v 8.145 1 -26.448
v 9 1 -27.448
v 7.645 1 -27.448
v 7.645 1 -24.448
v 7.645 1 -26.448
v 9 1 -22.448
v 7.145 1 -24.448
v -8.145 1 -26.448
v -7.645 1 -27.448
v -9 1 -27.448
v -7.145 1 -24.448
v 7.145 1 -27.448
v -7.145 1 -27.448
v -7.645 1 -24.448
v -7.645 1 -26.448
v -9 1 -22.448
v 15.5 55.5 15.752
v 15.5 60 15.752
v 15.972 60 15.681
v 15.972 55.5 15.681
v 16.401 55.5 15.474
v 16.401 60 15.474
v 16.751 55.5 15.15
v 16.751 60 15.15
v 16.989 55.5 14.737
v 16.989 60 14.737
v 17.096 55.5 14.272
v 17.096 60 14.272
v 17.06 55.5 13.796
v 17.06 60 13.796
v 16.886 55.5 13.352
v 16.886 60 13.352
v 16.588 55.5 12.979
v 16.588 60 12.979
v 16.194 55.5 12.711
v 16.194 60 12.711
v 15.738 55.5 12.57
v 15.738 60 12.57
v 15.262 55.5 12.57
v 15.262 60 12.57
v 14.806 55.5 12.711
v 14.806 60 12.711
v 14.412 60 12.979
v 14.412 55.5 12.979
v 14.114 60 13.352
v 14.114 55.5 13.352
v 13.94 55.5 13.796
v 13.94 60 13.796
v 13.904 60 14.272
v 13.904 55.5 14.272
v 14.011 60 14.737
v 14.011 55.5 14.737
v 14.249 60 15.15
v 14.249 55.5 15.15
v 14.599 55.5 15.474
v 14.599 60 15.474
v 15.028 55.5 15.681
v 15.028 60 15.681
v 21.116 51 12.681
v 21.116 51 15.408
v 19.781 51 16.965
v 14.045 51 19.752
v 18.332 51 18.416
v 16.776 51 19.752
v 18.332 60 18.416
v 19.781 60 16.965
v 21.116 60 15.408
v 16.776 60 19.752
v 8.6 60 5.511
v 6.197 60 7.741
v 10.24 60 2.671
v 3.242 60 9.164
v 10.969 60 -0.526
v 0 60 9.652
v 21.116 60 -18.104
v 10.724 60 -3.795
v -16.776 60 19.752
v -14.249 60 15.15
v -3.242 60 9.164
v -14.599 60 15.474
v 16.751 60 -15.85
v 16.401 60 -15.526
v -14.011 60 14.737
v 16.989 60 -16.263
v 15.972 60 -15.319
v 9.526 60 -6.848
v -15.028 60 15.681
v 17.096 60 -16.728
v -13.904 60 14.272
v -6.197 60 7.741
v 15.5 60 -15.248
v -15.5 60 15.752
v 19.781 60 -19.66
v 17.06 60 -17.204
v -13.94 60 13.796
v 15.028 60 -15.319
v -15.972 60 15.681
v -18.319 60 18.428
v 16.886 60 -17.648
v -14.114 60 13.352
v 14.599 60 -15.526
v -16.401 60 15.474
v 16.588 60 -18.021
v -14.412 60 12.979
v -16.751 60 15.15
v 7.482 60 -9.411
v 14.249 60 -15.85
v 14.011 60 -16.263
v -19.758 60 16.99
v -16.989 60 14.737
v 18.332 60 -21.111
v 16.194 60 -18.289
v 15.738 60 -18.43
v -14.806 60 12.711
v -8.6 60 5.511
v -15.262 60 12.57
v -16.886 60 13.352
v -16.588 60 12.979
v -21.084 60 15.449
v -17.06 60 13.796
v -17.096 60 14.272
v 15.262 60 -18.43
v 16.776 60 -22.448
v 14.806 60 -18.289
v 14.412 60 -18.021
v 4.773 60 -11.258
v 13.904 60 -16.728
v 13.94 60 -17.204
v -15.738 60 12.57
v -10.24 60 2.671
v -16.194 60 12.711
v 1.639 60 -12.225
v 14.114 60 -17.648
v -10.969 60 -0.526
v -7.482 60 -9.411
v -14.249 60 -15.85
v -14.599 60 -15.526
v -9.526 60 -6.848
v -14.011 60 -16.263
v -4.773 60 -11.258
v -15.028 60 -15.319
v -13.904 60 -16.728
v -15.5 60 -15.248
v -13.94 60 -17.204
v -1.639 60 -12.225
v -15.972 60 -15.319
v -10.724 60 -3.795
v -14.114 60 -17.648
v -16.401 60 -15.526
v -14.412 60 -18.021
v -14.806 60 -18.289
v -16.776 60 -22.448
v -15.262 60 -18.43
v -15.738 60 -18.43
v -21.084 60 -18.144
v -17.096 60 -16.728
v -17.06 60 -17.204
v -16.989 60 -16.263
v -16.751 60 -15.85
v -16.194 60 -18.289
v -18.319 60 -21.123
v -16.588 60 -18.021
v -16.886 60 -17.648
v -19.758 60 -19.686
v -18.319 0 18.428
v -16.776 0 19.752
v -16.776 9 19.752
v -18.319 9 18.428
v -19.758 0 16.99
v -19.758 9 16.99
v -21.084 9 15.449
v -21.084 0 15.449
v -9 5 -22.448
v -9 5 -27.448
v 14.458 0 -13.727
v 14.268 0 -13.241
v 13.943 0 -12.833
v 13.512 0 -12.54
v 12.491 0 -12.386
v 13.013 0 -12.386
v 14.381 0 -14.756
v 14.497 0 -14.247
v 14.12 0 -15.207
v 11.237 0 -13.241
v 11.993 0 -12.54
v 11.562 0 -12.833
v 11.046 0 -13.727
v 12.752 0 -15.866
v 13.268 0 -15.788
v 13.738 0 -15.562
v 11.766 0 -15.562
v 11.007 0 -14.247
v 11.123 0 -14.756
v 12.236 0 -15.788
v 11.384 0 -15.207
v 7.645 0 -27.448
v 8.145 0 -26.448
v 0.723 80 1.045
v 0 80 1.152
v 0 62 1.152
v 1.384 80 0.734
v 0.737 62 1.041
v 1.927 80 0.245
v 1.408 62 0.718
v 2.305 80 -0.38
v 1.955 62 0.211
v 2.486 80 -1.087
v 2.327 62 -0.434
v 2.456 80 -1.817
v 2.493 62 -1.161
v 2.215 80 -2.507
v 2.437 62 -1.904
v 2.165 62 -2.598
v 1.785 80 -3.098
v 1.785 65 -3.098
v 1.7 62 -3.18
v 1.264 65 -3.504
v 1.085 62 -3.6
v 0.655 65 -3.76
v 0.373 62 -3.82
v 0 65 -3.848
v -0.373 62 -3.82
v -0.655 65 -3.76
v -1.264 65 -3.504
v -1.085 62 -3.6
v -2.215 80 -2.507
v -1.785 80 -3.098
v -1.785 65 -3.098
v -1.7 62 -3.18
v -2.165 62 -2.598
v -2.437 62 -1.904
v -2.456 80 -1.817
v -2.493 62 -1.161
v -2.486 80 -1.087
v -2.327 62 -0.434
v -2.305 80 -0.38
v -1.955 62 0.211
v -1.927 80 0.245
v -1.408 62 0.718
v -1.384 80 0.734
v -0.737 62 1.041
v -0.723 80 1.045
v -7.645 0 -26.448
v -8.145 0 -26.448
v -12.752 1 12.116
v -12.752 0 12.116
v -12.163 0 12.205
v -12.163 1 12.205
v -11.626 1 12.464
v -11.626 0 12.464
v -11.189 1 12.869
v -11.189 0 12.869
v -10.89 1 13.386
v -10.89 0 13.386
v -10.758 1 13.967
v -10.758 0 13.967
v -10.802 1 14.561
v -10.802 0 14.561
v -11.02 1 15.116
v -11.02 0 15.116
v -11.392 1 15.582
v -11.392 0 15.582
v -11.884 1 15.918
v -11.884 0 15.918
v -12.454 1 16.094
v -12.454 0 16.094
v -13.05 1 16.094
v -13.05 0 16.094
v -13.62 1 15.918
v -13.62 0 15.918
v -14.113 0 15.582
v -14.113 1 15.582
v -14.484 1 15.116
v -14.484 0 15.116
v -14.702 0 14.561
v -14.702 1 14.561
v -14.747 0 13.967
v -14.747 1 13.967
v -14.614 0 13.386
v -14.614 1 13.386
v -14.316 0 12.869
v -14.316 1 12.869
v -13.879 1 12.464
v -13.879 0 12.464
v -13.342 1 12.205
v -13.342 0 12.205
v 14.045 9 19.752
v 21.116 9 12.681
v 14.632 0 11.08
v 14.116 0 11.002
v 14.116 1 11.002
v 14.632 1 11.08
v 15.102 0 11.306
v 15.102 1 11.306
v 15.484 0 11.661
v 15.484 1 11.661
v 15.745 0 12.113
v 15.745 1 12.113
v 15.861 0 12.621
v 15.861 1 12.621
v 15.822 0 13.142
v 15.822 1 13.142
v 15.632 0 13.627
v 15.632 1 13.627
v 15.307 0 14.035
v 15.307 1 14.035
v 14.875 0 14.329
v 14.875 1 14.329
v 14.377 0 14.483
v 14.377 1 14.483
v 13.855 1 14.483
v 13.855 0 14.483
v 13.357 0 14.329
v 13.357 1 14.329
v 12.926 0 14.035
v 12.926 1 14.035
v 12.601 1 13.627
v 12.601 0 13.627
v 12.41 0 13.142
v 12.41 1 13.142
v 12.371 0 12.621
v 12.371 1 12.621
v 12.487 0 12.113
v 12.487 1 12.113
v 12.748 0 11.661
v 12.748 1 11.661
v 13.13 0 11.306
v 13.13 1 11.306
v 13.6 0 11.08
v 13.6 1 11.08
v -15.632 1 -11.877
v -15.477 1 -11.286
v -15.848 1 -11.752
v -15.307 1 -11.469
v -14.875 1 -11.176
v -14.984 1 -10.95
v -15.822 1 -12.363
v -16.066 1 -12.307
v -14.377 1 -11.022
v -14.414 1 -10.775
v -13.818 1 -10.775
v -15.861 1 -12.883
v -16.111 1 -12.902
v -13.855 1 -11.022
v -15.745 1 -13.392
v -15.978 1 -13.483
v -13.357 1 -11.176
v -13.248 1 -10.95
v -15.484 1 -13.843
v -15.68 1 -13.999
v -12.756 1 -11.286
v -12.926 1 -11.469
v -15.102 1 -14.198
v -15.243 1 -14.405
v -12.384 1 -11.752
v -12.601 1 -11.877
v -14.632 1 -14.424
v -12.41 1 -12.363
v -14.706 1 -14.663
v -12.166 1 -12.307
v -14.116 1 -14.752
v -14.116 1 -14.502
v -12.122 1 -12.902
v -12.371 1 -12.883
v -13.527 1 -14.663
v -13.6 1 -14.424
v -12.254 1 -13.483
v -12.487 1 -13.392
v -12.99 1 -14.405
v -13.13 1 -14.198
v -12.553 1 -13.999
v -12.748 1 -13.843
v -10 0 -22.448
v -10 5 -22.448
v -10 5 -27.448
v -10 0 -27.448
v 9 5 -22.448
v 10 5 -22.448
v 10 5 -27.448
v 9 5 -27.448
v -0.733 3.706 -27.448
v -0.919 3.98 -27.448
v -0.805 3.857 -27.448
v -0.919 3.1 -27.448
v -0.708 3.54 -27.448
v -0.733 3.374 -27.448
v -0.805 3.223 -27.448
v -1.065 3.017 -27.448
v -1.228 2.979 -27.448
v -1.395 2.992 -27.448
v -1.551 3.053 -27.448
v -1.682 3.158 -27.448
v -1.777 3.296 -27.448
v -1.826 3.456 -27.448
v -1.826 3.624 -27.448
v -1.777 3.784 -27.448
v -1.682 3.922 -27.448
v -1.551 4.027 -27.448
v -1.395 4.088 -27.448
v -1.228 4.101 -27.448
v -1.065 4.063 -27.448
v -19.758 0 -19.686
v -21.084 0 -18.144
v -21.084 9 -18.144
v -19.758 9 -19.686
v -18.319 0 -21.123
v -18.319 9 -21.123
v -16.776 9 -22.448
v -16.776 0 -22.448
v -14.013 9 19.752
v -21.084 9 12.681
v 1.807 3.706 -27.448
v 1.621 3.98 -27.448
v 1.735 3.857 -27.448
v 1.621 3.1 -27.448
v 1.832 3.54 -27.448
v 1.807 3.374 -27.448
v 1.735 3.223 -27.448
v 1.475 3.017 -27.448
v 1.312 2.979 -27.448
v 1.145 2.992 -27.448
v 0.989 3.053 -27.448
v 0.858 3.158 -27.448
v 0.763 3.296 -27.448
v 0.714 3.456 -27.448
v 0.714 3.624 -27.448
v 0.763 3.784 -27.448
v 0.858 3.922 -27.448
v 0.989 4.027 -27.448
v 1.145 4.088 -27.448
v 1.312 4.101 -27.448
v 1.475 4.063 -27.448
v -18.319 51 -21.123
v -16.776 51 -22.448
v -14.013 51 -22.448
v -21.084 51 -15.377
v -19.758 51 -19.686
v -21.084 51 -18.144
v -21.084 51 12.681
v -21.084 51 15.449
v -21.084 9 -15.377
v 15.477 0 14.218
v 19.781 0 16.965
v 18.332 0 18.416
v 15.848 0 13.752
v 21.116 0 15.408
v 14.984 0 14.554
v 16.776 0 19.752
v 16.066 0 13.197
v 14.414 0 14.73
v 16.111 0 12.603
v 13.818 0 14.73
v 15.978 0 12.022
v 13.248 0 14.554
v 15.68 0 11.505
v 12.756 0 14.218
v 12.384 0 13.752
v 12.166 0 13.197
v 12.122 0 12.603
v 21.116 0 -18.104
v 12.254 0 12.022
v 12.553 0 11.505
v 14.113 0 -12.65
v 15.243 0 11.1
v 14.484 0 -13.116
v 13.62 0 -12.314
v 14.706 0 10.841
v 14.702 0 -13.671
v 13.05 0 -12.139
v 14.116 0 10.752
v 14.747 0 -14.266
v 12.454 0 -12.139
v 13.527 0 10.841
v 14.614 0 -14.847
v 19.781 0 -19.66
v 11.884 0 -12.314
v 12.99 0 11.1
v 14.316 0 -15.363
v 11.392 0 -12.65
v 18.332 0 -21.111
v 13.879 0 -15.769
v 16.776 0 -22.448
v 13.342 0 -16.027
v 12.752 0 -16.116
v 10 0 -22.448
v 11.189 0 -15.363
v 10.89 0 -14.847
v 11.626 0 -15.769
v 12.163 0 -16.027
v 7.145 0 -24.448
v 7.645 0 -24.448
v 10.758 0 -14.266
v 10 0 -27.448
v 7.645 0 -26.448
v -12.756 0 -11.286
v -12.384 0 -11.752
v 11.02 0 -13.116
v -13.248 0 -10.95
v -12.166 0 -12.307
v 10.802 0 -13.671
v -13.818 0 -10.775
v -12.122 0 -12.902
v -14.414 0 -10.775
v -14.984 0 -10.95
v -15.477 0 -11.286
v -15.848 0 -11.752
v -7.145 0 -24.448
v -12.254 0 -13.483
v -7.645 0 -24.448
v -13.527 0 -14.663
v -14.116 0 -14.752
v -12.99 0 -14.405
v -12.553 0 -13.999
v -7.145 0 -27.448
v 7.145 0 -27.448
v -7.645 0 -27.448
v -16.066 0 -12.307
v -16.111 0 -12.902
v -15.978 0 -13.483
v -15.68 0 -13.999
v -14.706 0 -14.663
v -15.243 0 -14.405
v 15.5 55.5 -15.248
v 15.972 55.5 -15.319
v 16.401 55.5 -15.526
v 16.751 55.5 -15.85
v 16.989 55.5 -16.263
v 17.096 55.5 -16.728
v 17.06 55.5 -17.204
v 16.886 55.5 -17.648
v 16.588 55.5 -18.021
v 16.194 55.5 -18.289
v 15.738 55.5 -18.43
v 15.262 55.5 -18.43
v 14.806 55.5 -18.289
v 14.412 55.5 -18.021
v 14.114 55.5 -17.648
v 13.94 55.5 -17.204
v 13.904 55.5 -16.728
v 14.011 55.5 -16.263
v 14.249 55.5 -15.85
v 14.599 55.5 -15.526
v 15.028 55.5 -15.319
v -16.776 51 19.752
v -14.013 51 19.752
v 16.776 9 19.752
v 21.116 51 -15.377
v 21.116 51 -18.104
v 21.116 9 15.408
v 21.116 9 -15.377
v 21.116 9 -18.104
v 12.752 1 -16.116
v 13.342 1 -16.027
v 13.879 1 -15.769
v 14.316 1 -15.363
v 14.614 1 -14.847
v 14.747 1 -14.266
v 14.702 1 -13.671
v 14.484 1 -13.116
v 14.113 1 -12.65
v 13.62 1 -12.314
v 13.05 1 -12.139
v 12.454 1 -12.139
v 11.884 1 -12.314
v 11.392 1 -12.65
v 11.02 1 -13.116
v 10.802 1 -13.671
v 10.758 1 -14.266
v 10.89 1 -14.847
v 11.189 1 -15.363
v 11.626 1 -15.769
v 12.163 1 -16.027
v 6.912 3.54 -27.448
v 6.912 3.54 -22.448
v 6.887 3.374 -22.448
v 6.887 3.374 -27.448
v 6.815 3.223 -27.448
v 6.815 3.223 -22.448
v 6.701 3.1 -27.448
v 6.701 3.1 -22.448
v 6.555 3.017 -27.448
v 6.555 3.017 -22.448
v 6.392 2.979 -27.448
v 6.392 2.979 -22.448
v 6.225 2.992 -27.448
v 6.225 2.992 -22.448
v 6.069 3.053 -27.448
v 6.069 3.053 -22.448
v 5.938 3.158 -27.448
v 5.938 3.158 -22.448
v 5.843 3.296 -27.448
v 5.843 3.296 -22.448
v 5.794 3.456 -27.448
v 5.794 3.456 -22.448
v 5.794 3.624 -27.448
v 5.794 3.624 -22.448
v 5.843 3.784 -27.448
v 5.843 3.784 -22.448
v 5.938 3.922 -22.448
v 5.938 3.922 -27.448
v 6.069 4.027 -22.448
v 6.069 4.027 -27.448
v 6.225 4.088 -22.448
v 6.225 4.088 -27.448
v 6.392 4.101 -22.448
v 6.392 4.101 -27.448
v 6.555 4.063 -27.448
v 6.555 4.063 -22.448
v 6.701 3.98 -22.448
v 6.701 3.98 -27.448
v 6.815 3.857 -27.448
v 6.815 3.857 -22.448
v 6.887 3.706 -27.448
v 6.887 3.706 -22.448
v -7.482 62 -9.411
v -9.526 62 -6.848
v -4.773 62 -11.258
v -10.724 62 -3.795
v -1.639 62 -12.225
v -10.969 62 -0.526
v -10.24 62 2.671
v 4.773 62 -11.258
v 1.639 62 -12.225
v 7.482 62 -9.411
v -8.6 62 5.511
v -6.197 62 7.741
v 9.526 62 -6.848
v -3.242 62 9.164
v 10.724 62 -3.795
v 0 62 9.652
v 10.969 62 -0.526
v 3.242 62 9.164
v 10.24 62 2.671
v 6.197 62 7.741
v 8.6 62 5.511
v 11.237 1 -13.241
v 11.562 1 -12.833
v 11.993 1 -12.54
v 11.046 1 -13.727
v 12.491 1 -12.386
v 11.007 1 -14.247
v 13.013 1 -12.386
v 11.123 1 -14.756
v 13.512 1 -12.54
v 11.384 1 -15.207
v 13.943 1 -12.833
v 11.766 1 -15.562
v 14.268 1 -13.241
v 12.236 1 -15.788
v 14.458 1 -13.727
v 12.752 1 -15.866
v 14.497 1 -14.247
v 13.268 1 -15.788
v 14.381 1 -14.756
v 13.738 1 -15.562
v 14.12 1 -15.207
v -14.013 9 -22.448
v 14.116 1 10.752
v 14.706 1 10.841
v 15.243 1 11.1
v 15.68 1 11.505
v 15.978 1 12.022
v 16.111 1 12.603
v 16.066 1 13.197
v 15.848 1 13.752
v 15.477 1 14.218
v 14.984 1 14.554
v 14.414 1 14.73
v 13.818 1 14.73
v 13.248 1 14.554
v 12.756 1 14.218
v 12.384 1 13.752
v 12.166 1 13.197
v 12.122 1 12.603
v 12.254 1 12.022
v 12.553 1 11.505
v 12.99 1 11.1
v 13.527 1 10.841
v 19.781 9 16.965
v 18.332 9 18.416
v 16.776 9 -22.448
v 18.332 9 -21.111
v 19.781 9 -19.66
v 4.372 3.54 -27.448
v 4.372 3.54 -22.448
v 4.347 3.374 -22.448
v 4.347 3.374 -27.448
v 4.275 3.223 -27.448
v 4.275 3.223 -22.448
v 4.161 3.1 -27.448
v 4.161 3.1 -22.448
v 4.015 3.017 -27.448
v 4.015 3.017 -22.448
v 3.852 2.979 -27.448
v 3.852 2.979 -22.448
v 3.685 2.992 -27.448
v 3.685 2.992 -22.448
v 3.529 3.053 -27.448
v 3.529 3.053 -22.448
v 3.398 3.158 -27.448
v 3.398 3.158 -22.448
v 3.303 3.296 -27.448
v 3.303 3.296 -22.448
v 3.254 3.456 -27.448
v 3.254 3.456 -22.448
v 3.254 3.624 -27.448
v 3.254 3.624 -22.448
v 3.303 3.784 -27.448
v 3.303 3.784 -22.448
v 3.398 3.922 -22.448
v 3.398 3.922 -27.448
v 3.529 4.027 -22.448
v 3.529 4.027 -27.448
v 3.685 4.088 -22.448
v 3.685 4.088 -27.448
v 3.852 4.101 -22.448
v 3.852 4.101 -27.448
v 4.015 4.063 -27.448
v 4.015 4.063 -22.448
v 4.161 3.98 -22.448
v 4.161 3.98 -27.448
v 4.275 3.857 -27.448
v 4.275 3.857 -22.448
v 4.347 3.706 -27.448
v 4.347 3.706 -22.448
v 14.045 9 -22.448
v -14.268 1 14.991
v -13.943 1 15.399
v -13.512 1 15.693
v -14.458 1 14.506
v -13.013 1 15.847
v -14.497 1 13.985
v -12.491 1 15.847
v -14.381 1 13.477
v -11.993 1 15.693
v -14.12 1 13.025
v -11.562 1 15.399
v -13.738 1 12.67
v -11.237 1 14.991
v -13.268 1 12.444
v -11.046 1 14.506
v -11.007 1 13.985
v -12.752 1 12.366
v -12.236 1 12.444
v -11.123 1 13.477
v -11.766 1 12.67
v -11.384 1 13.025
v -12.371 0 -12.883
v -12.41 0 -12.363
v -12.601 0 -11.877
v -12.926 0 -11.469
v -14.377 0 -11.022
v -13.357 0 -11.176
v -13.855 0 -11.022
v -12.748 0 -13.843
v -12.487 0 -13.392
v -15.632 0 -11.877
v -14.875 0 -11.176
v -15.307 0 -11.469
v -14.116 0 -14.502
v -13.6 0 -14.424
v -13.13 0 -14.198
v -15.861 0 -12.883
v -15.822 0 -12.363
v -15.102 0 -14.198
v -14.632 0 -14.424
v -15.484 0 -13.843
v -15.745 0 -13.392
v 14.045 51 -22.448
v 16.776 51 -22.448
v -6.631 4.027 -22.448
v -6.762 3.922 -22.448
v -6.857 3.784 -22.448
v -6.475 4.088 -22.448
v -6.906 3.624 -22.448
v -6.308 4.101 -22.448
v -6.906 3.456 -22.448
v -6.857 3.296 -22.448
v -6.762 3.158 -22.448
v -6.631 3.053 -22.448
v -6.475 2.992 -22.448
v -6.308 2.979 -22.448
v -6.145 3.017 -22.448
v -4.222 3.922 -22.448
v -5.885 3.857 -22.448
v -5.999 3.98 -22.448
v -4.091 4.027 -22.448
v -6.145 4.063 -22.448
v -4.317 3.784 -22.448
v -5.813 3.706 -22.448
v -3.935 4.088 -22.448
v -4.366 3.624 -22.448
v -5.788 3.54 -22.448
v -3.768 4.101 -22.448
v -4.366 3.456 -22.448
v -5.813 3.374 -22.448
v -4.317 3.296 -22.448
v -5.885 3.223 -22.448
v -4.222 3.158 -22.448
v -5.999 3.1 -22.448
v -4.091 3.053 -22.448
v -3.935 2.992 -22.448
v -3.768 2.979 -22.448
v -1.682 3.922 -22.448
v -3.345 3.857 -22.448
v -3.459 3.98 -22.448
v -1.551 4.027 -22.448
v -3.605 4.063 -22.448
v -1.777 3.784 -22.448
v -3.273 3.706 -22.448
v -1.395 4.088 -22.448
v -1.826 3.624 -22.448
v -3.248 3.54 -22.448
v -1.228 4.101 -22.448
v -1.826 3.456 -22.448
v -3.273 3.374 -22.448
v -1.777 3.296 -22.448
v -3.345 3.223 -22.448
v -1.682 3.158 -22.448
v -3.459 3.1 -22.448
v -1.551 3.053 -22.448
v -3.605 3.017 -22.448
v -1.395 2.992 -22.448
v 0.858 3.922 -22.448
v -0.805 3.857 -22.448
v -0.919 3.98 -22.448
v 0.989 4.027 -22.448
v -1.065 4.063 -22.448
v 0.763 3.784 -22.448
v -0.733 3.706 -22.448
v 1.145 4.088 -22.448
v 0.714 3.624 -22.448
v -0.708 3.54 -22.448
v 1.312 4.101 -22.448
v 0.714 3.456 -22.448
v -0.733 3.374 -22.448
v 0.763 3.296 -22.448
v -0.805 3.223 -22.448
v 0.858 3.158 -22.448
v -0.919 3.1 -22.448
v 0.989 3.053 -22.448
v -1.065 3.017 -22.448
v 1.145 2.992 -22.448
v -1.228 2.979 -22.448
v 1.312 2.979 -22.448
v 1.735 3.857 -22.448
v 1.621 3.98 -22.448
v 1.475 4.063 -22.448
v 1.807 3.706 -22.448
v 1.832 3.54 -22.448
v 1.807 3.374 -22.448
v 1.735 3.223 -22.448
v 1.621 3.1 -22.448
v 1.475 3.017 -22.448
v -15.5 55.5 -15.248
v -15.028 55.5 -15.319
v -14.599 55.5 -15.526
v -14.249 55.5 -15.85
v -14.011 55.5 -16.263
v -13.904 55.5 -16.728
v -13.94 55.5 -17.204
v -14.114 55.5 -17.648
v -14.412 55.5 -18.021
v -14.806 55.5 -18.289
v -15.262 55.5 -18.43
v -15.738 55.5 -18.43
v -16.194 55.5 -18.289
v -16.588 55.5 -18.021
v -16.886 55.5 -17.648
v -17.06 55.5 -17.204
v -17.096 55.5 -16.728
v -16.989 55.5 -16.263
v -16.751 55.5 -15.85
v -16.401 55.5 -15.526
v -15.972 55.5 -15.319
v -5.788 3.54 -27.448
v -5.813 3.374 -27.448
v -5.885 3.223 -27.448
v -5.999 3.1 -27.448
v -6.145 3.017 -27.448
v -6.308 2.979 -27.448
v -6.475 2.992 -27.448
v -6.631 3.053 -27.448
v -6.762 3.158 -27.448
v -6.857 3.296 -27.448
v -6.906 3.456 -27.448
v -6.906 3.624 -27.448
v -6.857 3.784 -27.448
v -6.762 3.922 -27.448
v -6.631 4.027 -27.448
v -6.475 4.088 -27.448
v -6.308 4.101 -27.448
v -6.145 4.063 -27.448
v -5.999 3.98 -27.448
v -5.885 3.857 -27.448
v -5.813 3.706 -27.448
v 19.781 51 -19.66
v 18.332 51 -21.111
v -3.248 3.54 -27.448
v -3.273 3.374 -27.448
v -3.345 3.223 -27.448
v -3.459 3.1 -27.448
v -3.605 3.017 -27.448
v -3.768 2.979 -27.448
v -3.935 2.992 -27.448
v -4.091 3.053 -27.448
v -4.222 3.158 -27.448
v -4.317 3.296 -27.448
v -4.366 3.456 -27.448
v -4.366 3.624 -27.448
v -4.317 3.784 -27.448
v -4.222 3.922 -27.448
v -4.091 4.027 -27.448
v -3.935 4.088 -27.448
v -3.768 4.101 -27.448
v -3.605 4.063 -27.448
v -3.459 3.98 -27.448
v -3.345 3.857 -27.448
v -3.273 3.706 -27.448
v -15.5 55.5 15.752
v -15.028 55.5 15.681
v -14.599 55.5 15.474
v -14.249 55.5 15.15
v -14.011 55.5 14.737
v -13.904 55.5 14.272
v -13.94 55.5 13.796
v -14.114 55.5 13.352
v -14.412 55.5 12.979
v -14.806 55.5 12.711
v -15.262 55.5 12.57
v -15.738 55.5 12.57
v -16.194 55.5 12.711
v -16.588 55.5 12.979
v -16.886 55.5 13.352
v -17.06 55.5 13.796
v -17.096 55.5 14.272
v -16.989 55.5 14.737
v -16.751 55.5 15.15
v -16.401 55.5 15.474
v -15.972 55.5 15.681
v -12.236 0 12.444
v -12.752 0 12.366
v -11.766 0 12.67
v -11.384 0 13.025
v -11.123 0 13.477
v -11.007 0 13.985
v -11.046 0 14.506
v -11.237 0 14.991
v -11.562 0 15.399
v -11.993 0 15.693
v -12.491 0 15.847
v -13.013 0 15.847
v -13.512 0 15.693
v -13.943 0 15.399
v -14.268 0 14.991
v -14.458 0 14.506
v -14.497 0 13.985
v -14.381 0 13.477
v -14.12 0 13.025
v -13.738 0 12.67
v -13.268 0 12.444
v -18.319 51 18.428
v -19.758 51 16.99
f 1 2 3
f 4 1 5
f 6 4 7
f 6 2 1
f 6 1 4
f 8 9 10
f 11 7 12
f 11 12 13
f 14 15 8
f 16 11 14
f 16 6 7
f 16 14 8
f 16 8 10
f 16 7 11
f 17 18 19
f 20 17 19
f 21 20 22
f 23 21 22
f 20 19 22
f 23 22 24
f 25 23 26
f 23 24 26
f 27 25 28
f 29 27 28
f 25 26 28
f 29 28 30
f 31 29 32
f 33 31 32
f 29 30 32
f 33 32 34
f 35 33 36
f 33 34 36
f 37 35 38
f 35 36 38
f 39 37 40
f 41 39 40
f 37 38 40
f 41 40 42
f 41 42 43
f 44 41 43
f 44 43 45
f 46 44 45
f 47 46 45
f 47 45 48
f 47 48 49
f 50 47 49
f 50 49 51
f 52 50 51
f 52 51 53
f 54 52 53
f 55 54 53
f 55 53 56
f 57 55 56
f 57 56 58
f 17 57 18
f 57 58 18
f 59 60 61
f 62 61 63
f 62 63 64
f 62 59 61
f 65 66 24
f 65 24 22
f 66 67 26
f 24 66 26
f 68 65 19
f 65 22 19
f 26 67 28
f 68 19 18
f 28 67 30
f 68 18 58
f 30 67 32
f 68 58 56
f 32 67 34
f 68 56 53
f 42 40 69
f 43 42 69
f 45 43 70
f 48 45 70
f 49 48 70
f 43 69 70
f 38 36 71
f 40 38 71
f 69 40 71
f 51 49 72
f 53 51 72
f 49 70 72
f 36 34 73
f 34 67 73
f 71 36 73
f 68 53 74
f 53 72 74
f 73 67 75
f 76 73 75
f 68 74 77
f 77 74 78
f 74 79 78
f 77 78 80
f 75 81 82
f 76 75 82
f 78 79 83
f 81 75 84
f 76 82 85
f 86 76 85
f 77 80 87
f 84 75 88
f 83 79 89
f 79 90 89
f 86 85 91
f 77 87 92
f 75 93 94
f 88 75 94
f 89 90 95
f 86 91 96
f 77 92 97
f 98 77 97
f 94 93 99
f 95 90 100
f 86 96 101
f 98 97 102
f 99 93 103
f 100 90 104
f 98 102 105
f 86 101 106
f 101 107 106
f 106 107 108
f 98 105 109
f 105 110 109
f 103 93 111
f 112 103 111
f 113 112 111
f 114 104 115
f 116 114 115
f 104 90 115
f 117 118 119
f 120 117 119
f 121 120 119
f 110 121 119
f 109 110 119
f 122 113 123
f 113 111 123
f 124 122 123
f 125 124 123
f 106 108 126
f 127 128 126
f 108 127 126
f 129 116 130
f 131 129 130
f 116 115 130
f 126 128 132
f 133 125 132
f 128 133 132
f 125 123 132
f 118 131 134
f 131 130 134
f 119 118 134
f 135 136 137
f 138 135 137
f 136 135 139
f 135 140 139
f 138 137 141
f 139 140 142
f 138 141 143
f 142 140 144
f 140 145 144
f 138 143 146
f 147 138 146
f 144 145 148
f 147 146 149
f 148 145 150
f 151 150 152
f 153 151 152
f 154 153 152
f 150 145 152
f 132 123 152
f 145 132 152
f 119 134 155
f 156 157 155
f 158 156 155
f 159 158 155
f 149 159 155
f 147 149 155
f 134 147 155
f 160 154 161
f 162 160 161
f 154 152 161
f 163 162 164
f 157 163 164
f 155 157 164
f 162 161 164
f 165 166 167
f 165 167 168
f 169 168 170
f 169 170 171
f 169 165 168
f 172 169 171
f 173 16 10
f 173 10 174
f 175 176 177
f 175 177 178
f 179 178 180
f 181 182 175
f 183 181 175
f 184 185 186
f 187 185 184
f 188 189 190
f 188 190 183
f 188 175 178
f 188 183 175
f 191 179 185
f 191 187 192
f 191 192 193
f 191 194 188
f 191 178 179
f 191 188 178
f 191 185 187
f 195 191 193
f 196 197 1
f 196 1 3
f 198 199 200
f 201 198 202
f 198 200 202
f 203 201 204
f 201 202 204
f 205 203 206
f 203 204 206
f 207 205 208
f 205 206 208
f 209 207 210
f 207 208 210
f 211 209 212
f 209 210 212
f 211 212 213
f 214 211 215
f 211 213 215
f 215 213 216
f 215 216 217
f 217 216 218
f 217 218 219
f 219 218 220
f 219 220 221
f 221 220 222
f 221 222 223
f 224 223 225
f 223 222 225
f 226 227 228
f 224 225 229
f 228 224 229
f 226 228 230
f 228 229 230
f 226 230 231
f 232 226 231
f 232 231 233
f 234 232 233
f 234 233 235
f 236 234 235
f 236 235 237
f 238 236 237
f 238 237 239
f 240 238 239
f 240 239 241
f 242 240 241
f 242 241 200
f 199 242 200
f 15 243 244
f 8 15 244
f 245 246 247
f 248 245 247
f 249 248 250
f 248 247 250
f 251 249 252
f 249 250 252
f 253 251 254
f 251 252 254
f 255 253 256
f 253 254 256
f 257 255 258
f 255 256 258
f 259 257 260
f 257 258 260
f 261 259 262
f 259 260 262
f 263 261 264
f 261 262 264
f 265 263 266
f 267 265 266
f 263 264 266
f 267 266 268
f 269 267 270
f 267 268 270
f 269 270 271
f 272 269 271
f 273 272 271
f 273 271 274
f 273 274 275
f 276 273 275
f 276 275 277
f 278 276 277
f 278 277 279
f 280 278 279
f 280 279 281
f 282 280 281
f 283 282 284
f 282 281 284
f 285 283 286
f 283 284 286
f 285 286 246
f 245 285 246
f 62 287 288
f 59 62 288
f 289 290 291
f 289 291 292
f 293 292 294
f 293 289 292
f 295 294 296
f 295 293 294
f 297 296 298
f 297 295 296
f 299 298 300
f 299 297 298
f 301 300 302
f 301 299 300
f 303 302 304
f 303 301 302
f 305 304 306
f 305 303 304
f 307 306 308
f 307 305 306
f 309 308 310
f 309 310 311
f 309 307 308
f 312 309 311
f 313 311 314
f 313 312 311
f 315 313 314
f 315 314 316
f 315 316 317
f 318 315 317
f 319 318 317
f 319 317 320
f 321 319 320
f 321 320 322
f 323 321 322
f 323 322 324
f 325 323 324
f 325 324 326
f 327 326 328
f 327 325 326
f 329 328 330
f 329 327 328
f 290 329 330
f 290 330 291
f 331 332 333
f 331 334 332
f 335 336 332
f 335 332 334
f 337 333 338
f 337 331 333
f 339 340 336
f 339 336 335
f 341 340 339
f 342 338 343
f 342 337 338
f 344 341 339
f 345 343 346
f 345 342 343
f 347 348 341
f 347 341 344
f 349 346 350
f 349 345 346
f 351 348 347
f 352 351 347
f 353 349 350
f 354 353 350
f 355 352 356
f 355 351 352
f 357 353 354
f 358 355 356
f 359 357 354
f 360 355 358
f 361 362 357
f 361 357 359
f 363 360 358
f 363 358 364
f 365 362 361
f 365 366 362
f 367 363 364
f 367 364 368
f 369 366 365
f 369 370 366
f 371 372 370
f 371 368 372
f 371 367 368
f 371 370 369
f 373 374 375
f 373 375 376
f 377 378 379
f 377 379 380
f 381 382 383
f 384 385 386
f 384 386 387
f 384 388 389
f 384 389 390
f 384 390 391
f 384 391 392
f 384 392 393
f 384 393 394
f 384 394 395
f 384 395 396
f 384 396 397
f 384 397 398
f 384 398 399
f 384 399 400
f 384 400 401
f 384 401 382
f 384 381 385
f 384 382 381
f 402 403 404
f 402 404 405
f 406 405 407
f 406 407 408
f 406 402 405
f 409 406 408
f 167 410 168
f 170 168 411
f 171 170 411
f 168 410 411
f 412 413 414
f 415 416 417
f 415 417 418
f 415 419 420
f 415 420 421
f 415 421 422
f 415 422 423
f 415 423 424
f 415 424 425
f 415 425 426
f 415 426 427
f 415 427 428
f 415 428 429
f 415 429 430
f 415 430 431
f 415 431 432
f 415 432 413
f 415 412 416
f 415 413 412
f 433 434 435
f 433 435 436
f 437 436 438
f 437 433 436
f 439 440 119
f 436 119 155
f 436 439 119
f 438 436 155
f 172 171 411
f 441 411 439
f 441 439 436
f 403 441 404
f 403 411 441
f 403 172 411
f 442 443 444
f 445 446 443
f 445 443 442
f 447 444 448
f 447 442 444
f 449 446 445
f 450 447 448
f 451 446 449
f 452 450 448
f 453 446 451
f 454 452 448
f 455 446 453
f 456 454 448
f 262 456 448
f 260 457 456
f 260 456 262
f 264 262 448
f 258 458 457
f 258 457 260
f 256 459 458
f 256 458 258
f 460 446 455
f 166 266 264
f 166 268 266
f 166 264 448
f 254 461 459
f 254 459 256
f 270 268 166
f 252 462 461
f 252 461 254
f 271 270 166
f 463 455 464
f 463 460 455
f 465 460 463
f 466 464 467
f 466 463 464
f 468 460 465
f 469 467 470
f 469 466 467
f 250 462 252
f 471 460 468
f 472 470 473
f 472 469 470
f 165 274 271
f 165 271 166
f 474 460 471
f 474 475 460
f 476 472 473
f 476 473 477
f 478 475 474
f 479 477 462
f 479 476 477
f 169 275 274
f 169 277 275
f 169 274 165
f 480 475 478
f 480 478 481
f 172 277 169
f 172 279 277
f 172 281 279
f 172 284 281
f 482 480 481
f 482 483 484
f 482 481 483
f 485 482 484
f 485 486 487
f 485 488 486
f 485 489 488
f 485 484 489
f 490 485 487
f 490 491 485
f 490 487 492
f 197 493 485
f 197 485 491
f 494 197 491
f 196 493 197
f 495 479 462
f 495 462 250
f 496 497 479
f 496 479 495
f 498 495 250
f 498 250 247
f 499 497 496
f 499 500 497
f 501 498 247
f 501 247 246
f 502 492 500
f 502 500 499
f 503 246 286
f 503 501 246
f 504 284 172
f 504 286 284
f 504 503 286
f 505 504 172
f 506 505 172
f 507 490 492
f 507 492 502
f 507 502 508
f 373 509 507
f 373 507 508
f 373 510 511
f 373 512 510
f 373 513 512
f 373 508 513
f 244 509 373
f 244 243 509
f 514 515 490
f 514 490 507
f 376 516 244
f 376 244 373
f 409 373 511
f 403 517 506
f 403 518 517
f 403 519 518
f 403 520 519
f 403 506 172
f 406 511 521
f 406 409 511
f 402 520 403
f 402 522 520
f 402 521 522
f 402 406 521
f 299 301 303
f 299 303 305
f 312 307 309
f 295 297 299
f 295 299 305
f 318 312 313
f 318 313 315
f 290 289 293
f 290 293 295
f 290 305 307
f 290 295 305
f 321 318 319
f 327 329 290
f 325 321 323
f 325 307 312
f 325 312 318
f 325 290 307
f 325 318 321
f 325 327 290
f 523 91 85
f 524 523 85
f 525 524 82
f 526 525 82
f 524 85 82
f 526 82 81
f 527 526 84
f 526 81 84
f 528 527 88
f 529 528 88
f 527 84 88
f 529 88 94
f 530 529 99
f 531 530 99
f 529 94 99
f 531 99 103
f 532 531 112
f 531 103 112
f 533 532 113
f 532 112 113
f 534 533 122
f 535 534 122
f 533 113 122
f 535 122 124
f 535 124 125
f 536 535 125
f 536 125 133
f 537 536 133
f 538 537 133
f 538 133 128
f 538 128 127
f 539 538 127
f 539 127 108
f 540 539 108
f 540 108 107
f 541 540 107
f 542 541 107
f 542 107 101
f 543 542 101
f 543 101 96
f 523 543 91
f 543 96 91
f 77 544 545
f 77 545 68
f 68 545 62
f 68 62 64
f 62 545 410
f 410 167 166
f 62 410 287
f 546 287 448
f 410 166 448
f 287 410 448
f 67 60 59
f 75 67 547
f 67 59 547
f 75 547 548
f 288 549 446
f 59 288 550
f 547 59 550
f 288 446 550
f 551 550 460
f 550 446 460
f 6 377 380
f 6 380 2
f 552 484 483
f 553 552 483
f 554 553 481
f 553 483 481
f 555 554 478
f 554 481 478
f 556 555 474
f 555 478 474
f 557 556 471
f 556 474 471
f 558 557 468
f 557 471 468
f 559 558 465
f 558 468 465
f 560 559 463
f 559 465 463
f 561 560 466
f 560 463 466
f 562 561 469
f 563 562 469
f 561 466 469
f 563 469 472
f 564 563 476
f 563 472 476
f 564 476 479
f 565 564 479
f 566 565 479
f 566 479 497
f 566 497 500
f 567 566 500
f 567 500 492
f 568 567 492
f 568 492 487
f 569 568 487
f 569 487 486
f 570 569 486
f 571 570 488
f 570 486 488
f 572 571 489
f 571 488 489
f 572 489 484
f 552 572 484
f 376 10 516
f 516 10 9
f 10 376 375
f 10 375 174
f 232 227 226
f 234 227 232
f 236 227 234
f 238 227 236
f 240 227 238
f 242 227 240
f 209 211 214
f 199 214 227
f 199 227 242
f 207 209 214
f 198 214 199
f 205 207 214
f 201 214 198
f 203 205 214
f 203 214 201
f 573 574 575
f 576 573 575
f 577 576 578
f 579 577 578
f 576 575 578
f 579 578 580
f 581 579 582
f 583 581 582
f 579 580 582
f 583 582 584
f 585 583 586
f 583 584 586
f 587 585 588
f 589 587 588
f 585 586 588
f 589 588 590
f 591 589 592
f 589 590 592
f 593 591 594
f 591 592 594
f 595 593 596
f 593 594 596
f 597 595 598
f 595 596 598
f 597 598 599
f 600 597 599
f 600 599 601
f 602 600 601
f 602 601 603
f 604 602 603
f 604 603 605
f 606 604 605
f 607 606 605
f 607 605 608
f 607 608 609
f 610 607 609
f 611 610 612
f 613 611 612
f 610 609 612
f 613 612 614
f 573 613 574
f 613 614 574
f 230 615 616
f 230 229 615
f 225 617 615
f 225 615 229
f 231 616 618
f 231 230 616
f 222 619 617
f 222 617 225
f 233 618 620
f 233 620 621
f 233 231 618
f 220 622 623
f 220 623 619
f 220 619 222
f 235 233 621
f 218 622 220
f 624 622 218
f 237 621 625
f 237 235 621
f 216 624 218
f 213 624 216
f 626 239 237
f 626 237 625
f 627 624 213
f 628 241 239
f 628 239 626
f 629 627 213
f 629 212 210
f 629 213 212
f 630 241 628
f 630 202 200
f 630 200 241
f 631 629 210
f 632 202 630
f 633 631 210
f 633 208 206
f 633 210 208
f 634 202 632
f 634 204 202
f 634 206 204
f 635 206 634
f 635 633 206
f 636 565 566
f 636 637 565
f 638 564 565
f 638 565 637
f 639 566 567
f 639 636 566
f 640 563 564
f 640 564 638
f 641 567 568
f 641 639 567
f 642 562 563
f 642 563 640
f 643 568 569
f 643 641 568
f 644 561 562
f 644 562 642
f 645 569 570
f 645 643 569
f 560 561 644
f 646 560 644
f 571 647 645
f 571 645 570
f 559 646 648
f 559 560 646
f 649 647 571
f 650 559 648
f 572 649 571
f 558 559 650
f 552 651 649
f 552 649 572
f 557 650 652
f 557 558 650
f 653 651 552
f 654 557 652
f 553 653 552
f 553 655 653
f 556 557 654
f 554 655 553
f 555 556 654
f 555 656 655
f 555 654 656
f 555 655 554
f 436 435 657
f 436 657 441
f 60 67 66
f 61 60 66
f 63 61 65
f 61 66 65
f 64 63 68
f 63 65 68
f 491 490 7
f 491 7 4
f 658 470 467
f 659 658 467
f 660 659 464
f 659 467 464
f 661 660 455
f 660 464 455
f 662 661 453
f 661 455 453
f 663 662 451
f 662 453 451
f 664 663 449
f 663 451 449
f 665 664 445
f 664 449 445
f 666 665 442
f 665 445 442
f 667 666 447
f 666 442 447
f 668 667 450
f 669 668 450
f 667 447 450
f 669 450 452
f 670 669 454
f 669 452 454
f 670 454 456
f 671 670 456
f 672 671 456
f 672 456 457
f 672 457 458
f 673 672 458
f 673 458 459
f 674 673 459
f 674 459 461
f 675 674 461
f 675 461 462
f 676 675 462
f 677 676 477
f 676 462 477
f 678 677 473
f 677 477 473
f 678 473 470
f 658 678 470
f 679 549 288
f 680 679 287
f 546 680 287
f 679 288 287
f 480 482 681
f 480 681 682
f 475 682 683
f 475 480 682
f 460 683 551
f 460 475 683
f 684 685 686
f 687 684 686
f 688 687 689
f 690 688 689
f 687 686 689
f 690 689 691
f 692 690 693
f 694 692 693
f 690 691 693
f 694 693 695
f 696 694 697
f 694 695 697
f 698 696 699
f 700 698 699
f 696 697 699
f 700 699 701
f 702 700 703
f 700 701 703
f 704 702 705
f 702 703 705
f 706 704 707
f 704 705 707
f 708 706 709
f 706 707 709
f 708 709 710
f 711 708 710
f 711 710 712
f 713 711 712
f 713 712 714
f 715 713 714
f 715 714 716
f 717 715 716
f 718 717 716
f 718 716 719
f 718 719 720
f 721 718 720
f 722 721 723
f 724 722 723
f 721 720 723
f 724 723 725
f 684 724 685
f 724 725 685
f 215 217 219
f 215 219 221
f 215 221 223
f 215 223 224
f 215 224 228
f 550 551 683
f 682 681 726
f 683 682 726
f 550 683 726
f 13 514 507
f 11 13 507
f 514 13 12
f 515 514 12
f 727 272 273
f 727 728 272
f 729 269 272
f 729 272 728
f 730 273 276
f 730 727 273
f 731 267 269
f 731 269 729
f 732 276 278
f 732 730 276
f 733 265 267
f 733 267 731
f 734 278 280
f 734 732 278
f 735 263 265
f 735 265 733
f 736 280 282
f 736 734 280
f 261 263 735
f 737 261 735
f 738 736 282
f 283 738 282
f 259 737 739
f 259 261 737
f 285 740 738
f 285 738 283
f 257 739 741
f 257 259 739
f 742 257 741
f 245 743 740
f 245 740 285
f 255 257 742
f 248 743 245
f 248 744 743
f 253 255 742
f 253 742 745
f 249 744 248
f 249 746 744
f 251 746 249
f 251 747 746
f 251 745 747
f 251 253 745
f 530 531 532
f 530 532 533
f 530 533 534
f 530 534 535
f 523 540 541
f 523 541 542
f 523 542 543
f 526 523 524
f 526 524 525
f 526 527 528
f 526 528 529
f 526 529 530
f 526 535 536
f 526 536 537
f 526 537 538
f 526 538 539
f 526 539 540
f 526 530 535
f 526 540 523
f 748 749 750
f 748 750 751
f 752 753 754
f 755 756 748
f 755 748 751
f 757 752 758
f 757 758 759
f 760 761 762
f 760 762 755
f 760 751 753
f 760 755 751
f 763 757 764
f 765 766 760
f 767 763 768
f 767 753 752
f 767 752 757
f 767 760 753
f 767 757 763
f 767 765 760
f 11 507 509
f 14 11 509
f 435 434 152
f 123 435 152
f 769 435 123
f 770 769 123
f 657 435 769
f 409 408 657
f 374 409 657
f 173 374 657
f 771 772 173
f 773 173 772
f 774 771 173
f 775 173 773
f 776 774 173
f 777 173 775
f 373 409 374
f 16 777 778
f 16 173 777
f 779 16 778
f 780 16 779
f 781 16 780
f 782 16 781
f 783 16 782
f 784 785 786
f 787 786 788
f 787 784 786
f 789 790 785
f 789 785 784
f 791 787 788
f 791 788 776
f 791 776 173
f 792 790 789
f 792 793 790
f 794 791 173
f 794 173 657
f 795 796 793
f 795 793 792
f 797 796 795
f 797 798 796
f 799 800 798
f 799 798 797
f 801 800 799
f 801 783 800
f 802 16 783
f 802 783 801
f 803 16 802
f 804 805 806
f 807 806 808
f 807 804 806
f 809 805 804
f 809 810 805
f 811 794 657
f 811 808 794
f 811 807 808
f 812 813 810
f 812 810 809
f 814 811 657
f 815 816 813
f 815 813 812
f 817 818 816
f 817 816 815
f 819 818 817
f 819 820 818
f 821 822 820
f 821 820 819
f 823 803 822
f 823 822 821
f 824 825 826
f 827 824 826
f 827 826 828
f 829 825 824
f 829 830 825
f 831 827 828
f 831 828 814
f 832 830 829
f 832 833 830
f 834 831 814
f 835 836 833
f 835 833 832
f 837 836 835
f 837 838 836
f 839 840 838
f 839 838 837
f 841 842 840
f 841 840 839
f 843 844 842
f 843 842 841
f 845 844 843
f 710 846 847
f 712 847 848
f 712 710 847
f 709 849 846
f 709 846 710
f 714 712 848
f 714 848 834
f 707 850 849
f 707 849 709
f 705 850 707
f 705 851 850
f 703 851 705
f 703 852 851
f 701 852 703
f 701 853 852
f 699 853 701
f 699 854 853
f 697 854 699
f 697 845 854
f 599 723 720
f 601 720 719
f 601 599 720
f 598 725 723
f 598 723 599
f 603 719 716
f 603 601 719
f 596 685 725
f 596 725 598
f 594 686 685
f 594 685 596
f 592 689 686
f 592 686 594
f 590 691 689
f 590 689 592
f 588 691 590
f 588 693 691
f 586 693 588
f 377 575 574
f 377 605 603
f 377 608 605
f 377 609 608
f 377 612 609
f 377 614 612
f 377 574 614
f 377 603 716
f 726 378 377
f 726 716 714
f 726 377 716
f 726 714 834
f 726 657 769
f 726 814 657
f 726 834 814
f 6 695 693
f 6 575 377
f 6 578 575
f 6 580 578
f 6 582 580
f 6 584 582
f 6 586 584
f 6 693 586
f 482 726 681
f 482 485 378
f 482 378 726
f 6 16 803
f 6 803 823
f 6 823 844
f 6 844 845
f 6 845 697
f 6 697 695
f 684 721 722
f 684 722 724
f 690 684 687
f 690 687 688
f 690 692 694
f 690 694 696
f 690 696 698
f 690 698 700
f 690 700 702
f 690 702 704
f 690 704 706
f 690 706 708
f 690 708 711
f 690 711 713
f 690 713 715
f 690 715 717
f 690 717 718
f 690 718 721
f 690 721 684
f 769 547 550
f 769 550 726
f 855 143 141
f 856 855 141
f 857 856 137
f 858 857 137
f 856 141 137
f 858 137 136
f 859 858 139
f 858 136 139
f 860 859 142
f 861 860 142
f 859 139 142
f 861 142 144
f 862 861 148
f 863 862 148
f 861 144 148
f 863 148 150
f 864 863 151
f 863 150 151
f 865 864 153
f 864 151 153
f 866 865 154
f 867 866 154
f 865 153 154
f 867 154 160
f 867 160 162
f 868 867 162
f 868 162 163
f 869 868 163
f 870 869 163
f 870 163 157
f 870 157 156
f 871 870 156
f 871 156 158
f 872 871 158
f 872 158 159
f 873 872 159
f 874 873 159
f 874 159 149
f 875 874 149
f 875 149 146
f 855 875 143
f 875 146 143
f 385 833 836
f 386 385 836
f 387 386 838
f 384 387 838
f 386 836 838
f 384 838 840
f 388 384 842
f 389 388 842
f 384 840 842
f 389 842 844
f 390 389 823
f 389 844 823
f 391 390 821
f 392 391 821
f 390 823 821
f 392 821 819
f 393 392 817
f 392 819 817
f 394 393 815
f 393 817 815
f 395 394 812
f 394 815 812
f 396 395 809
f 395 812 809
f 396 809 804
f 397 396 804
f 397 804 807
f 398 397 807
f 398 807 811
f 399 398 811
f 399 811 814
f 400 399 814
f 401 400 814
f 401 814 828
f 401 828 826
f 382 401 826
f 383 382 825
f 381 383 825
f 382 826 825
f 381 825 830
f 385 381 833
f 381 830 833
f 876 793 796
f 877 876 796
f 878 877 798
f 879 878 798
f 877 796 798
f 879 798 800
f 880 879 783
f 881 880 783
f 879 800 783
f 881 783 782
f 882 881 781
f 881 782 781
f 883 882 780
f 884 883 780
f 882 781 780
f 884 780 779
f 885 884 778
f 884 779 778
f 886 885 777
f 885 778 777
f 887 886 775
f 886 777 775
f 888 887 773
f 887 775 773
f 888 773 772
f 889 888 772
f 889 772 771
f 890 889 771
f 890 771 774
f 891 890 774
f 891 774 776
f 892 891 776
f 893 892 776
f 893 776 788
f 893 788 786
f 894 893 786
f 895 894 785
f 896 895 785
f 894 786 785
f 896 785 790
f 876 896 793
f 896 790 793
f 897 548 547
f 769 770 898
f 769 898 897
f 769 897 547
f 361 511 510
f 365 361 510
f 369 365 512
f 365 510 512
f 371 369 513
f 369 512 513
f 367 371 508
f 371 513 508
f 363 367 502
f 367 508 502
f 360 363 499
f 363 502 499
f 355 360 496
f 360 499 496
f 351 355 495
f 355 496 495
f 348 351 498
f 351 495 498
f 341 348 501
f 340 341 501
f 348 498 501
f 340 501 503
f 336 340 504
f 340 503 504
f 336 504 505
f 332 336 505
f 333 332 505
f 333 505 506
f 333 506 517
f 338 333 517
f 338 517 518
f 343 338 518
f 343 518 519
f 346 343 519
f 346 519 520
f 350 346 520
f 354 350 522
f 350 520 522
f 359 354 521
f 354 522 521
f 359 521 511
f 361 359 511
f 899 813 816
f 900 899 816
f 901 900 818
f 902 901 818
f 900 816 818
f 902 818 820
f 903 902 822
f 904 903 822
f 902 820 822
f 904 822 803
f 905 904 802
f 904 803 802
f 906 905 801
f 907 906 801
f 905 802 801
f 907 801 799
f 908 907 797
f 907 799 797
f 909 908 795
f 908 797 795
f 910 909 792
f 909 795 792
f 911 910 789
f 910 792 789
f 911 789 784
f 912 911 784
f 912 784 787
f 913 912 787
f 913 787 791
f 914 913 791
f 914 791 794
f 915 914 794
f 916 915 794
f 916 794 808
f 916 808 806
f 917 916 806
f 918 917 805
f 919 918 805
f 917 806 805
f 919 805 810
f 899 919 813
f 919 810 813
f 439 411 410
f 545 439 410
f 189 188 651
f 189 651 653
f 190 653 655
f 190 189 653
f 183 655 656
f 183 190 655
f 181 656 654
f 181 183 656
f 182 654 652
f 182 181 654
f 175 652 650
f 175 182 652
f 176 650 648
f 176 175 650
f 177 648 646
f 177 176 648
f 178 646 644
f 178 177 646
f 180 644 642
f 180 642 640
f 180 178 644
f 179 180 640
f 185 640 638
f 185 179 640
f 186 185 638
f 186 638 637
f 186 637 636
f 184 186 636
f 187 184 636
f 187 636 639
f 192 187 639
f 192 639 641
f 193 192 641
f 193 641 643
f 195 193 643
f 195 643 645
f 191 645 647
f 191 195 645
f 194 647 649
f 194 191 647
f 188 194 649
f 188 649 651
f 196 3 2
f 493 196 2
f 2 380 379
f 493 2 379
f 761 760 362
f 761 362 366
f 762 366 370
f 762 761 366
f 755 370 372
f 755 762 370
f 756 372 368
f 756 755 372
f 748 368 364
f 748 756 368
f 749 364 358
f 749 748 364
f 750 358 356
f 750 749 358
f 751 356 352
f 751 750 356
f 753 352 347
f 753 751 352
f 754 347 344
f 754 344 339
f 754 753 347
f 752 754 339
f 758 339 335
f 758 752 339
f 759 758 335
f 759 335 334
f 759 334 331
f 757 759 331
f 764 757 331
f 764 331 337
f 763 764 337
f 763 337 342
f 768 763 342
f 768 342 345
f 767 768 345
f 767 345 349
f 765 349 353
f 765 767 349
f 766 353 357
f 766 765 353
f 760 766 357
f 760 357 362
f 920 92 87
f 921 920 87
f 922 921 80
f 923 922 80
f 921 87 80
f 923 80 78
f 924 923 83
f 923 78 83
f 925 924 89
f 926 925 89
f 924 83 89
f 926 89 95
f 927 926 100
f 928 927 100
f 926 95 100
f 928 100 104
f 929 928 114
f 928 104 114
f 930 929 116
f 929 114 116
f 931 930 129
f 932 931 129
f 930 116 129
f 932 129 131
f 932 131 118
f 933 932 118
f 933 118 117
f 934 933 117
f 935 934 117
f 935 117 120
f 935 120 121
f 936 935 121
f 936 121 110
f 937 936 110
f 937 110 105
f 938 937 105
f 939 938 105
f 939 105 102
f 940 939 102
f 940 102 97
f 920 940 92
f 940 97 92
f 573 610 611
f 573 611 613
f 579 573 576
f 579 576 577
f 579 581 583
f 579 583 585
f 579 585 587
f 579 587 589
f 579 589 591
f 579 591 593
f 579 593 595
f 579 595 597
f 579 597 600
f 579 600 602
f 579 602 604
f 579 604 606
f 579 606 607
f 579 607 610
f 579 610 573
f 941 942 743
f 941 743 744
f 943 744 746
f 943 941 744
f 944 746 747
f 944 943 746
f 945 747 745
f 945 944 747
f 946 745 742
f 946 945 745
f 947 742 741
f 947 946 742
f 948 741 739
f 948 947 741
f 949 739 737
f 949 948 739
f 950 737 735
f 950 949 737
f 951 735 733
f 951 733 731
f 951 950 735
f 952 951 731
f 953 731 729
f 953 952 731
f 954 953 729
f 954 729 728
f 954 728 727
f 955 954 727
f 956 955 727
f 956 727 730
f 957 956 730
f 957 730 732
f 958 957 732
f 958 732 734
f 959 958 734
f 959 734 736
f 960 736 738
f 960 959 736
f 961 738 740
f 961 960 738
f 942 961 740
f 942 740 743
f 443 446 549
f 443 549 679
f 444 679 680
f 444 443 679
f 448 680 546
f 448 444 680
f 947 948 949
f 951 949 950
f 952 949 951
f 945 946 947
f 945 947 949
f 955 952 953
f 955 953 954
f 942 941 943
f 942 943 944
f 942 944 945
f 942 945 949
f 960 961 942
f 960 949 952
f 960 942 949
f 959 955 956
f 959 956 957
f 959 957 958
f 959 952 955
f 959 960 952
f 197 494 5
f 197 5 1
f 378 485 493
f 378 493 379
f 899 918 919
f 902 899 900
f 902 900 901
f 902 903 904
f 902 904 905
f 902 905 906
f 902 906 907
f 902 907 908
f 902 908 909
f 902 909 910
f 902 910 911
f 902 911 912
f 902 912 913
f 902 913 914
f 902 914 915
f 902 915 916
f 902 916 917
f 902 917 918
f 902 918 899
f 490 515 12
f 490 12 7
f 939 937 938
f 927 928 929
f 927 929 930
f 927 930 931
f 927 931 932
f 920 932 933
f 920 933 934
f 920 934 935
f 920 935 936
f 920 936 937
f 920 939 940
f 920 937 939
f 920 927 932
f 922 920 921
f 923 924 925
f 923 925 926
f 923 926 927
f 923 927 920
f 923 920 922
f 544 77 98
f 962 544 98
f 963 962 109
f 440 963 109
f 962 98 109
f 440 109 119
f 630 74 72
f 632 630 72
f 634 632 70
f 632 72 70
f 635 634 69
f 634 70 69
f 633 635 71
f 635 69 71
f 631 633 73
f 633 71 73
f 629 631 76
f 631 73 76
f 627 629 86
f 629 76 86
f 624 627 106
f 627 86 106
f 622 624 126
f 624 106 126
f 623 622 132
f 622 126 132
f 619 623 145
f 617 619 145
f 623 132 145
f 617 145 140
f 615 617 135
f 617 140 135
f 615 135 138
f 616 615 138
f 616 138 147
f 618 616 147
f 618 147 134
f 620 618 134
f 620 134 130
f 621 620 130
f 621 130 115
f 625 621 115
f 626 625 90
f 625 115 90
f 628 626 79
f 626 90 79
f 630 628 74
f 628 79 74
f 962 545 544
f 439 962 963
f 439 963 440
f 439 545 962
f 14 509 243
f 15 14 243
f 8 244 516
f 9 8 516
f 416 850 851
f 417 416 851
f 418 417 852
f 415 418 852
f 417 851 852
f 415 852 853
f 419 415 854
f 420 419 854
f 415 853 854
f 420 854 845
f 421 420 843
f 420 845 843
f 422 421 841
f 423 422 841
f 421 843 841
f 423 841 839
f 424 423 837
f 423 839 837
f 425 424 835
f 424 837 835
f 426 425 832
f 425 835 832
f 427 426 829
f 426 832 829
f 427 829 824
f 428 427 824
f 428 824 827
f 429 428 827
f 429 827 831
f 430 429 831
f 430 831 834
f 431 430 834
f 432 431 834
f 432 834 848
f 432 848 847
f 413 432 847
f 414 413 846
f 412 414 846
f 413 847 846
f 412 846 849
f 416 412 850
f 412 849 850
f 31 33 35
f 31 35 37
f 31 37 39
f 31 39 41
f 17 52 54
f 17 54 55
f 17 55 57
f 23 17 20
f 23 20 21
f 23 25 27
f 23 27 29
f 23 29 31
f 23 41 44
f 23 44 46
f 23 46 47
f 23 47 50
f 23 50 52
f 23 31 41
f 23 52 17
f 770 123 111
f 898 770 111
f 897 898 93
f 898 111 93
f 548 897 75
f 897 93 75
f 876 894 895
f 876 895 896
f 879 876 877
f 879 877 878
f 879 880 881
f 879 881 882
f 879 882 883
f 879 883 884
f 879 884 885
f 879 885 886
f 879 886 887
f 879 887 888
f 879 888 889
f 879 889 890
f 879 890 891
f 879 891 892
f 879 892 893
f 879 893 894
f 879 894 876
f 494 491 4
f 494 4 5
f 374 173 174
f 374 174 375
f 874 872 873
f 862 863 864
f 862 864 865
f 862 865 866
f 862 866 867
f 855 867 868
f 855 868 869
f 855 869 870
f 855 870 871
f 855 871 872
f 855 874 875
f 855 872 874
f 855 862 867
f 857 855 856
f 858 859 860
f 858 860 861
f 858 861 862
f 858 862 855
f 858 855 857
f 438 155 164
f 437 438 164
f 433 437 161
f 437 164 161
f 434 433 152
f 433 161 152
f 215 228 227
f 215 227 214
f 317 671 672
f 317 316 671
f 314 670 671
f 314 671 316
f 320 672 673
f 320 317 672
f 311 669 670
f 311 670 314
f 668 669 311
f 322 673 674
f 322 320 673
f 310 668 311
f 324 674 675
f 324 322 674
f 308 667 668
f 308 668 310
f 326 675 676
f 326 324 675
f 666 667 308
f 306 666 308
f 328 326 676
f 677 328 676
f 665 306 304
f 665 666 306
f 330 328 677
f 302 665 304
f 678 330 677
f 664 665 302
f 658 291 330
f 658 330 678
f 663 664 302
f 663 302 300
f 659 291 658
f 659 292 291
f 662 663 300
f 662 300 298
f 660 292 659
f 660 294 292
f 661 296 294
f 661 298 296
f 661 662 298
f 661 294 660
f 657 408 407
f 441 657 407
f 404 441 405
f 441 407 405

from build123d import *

# Parameters (mm, degrees)
EXTRUDE_1_DEPTH     = 60
EXTRUDE_2_DEPTH     = 9
SKETCH_7_R          = 11
EXTRUDE_3_DEPTH     = 2
SKETCH_8_R          = 2.5
EXTRUDE_4_DEPTH     = 18
CUT_EXTRUDE_START   = -15
CUT_EXTRUDE_1_DEPTH = 15
SKETCH_10_R         = 1.6
CUT_EXTRUDE_2_DEPTH = 4.5
EXTRUDE_5_DEPTH     = 5
CUT_EXTRUDE_3_DEPTH = 5
SKETCH_13_R         = 0.562342784
EXTRUDE_6_DEPTH     = 5
SKETCH_14_R         = 2
SKETCH_14_R_2       = 1.75
CUT_EXTRUDE_4_DEPTH = 1


with BuildPart() as part:
    # 草图2 → 凸台-拉伸1 (new body)
    with BuildSketch(Plane(origin=(0, 0, 0), x_dir=(1, 0, 0), z_dir=(0, 1, 0))):
        Polygon((-14.012734328, 22.447763171), (-21.08380214, 15.376695359), (-21.08380214, -12.681169017), (-14.012734328, -19.752236829), (14.045130048, -19.752236829), (21.11619786, -12.681169017), (21.11619786, 15.376695359), (14.045130048, 22.447763171), align=None)
    extrude(amount=EXTRUDE_1_DEPTH)

    # 草图5 → 凸台-拉伸2 (add)
    with BuildSketch(Plane(origin=(0, 60, 0), x_dir=(1, 0, 0), z_dir=(0, 1, 0))):
        with BuildLine():
            Line((-16.776242784, 22.447763171), (16.776242784, 22.447763171))
            ThreePointArc((16.776242784, 22.447763171), (19.070321818, 20.399669839), (21.11619786, 18.103613191))
            Line((21.11619786, 18.103613191), (21.11619786, -15.408086849))
            ThreePointArc((21.11619786, -15.408086849), (19.070321818, -17.704143498), (16.776242784, -19.752236829))
            Line((16.776242784, -19.752236829), (-16.776242784, -19.752236829))
            ThreePointArc((-16.776242784, -19.752236829), (-19.051917848, -17.722547478), (-21.08380214, -15.448831998))
            Line((-21.08380214, -15.448831998), (-21.08380214, 18.14435834))
            ThreePointArc((-21.08380214, 18.14435834), (-19.051917848, 20.41807382), (-16.776242784, 22.447763171))
        make_face()
    extrude_2 = extrude(amount=-EXTRUDE_2_DEPTH)

    # 镜向1: 凸台-拉伸2 across plane
    add(extrude_2.mirror(Plane.ZX.offset(30)))

    # 草图7 → 凸台-拉伸3 (add)
    with BuildSketch(Plane(origin=(0, 60, 0), x_dir=(1, 0, 0), z_dir=(0, 1, 0))):
        with Locations(Location((0, 1.347763171, 0), (0, 0, 270))):
            Circle(SKETCH_7_R)
    extrude(amount=EXTRUDE_3_DEPTH)

    # 草图8 → 凸台-拉伸4 (add)
    with BuildSketch(Plane(origin=(0, 62, 0), x_dir=(1, 0, 0), z_dir=(0, 1, 0))):
        with Locations(Location((0, 1.347763171, 0), (0, 0, 270))):
            Circle(SKETCH_8_R)
    extrude(amount=EXTRUDE_4_DEPTH)

    # 草图9 → 切除-拉伸1 (cut)
    with BuildSketch(Plane(origin=(0, 80, 0), x_dir=(1, 0, 0), z_dir=(0, 1, 0)).offset(CUT_EXTRUDE_START)):
        with BuildLine():
            Line((-1.785357107, 3.097763171), (1.785357107, 3.097763171))
            ThreePointArc((1.785357107, 3.097763171), (0, 3.847763171), (-1.785357107, 3.097763171))
        make_face()
    extrude(amount=CUT_EXTRUDE_1_DEPTH, mode=Mode.SUBTRACT)

    # 草图10 → 切除-拉伸2 (cut)
    with BuildSketch(Plane(origin=(0, 60, 0), x_dir=(1, 0, 0), z_dir=(0, 1, 0))):
        with Locations(Location((-15.5, 16.847763171, 0), (0, 0, 270))):
            Circle(SKETCH_10_R)
        with Locations(Location((15.5, 16.847763171, 0), (0, 0, 270))):
            Circle(SKETCH_10_R)
        with Locations(Location((15.5, -14.152236829, 0), (0, 0, 270))):
            Circle(SKETCH_10_R)
        with Locations(Location((-15.5, -14.152236829, 0), (0, 0, 270))):
            Circle(SKETCH_10_R)
    extrude(amount=-CUT_EXTRUDE_2_DEPTH, mode=Mode.SUBTRACT)

    # 草图11 → 凸台-拉伸5 (add)
    with BuildSketch(Plane(origin=(0, 0, -22.447763171), x_dir=(-1, 0, 0), z_dir=(0, 0, -1))):
        Polygon((10, 0), (-10, 0), (-10, 5), (-9, 5), (-9, 1), (9, 1), (9, 5), (10, 5), align=None)
    extrude(amount=EXTRUDE_5_DEPTH)

    # 草图12 → 切除-拉伸3 (cut)
    with BuildSketch(Plane.XZ):
        Polygon((-7.144738058, -27.447763171), (-7.144738058, -24.447763171), (-7.644738058, -24.447763171), (-7.644738058, -26.447763171), (-8.144738058, -26.447763171), (-7.644738058, -27.447763171), align=None)
        Polygon((7.644738058, -27.447763171), (7.144738058, -27.447763171), (7.144738058, -24.447763171), (7.644738058, -24.447763171), (7.644738058, -26.447763171), (8.144738058, -26.447763171), align=None)
    extrude(amount=-CUT_EXTRUDE_3_DEPTH, mode=Mode.SUBTRACT)

    # 草图13 → 凸台-拉伸6 (add)
    with BuildSketch(Plane(origin=(0, 0, -22.447763171), x_dir=(-1, 0, 0), z_dir=(0, 0, -1))):
        with Locations(Location((-1.27, 3.54, 0), (0, 0, 180))):
            Circle(SKETCH_13_R)
        with Locations(Location((-3.81, 3.54, 0), (0, 0, 180))):
            Circle(SKETCH_13_R)
        with Locations(Location((-6.35, 3.54, 0), (0, 0, 180))):
            Circle(SKETCH_13_R)
        with Locations(Location((6.35, 3.54, 0), (0, 0, 180))):
            Circle(SKETCH_13_R)
        with Locations(Location((3.81, 3.54, 0), (0, 0, 180))):
            Circle(SKETCH_13_R)
        with Locations(Location((1.27, 3.54, 0), (0, 0, 180))):
            Circle(SKETCH_13_R)
    extrude(amount=EXTRUDE_6_DEPTH)

    # 草图14 → 切除-拉伸4 (cut)
    # profile 1 of 4: a face of its own
    with BuildSketch(Plane.XZ):
        with Locations(Location((14.11619786, 12.752236829, 0), (0, 0, 270))):
            Circle(SKETCH_14_R)
        with Locations(Location((14.11619786, 12.752236829, 0), (0, 0, 270))):
            Circle(SKETCH_14_R_2, mode=Mode.SUBTRACT)
    # profile 2 of 4: a face of its own
    with BuildSketch(Plane.XZ):
        with Locations(Location((12.752236829, -14.11619786, 0), (0, 0, 270))):
            Circle(SKETCH_14_R)
        with Locations(Location((12.752236829, -14.11619786, 0), (0, 0, 270))):
            Circle(SKETCH_14_R_2, mode=Mode.SUBTRACT)
    # profile 3 of 4: a face of its own
    with BuildSketch(Plane.XZ):
        with Locations(Location((-14.11619786, -12.752236829, 0), (0, 0, 270))):
            Circle(SKETCH_14_R)
        with Locations(Location((-14.11619786, -12.752236829, 0), (0, 0, 270))):
            Circle(SKETCH_14_R_2, mode=Mode.SUBTRACT)
    # profile 4 of 4: a face of its own
    with BuildSketch(Plane.XZ):
        with Locations(Location((-12.752236829, 14.11619786, 0), (0, 0, 270))):
            Circle(SKETCH_14_R)
        with Locations(Location((-12.752236829, 14.11619786, 0), (0, 0, 270))):
            Circle(SKETCH_14_R_2, mode=Mode.SUBTRACT)
    extrude(amount=-CUT_EXTRUDE_4_DEPTH, mode=Mode.SUBTRACT)


solid = part.part
